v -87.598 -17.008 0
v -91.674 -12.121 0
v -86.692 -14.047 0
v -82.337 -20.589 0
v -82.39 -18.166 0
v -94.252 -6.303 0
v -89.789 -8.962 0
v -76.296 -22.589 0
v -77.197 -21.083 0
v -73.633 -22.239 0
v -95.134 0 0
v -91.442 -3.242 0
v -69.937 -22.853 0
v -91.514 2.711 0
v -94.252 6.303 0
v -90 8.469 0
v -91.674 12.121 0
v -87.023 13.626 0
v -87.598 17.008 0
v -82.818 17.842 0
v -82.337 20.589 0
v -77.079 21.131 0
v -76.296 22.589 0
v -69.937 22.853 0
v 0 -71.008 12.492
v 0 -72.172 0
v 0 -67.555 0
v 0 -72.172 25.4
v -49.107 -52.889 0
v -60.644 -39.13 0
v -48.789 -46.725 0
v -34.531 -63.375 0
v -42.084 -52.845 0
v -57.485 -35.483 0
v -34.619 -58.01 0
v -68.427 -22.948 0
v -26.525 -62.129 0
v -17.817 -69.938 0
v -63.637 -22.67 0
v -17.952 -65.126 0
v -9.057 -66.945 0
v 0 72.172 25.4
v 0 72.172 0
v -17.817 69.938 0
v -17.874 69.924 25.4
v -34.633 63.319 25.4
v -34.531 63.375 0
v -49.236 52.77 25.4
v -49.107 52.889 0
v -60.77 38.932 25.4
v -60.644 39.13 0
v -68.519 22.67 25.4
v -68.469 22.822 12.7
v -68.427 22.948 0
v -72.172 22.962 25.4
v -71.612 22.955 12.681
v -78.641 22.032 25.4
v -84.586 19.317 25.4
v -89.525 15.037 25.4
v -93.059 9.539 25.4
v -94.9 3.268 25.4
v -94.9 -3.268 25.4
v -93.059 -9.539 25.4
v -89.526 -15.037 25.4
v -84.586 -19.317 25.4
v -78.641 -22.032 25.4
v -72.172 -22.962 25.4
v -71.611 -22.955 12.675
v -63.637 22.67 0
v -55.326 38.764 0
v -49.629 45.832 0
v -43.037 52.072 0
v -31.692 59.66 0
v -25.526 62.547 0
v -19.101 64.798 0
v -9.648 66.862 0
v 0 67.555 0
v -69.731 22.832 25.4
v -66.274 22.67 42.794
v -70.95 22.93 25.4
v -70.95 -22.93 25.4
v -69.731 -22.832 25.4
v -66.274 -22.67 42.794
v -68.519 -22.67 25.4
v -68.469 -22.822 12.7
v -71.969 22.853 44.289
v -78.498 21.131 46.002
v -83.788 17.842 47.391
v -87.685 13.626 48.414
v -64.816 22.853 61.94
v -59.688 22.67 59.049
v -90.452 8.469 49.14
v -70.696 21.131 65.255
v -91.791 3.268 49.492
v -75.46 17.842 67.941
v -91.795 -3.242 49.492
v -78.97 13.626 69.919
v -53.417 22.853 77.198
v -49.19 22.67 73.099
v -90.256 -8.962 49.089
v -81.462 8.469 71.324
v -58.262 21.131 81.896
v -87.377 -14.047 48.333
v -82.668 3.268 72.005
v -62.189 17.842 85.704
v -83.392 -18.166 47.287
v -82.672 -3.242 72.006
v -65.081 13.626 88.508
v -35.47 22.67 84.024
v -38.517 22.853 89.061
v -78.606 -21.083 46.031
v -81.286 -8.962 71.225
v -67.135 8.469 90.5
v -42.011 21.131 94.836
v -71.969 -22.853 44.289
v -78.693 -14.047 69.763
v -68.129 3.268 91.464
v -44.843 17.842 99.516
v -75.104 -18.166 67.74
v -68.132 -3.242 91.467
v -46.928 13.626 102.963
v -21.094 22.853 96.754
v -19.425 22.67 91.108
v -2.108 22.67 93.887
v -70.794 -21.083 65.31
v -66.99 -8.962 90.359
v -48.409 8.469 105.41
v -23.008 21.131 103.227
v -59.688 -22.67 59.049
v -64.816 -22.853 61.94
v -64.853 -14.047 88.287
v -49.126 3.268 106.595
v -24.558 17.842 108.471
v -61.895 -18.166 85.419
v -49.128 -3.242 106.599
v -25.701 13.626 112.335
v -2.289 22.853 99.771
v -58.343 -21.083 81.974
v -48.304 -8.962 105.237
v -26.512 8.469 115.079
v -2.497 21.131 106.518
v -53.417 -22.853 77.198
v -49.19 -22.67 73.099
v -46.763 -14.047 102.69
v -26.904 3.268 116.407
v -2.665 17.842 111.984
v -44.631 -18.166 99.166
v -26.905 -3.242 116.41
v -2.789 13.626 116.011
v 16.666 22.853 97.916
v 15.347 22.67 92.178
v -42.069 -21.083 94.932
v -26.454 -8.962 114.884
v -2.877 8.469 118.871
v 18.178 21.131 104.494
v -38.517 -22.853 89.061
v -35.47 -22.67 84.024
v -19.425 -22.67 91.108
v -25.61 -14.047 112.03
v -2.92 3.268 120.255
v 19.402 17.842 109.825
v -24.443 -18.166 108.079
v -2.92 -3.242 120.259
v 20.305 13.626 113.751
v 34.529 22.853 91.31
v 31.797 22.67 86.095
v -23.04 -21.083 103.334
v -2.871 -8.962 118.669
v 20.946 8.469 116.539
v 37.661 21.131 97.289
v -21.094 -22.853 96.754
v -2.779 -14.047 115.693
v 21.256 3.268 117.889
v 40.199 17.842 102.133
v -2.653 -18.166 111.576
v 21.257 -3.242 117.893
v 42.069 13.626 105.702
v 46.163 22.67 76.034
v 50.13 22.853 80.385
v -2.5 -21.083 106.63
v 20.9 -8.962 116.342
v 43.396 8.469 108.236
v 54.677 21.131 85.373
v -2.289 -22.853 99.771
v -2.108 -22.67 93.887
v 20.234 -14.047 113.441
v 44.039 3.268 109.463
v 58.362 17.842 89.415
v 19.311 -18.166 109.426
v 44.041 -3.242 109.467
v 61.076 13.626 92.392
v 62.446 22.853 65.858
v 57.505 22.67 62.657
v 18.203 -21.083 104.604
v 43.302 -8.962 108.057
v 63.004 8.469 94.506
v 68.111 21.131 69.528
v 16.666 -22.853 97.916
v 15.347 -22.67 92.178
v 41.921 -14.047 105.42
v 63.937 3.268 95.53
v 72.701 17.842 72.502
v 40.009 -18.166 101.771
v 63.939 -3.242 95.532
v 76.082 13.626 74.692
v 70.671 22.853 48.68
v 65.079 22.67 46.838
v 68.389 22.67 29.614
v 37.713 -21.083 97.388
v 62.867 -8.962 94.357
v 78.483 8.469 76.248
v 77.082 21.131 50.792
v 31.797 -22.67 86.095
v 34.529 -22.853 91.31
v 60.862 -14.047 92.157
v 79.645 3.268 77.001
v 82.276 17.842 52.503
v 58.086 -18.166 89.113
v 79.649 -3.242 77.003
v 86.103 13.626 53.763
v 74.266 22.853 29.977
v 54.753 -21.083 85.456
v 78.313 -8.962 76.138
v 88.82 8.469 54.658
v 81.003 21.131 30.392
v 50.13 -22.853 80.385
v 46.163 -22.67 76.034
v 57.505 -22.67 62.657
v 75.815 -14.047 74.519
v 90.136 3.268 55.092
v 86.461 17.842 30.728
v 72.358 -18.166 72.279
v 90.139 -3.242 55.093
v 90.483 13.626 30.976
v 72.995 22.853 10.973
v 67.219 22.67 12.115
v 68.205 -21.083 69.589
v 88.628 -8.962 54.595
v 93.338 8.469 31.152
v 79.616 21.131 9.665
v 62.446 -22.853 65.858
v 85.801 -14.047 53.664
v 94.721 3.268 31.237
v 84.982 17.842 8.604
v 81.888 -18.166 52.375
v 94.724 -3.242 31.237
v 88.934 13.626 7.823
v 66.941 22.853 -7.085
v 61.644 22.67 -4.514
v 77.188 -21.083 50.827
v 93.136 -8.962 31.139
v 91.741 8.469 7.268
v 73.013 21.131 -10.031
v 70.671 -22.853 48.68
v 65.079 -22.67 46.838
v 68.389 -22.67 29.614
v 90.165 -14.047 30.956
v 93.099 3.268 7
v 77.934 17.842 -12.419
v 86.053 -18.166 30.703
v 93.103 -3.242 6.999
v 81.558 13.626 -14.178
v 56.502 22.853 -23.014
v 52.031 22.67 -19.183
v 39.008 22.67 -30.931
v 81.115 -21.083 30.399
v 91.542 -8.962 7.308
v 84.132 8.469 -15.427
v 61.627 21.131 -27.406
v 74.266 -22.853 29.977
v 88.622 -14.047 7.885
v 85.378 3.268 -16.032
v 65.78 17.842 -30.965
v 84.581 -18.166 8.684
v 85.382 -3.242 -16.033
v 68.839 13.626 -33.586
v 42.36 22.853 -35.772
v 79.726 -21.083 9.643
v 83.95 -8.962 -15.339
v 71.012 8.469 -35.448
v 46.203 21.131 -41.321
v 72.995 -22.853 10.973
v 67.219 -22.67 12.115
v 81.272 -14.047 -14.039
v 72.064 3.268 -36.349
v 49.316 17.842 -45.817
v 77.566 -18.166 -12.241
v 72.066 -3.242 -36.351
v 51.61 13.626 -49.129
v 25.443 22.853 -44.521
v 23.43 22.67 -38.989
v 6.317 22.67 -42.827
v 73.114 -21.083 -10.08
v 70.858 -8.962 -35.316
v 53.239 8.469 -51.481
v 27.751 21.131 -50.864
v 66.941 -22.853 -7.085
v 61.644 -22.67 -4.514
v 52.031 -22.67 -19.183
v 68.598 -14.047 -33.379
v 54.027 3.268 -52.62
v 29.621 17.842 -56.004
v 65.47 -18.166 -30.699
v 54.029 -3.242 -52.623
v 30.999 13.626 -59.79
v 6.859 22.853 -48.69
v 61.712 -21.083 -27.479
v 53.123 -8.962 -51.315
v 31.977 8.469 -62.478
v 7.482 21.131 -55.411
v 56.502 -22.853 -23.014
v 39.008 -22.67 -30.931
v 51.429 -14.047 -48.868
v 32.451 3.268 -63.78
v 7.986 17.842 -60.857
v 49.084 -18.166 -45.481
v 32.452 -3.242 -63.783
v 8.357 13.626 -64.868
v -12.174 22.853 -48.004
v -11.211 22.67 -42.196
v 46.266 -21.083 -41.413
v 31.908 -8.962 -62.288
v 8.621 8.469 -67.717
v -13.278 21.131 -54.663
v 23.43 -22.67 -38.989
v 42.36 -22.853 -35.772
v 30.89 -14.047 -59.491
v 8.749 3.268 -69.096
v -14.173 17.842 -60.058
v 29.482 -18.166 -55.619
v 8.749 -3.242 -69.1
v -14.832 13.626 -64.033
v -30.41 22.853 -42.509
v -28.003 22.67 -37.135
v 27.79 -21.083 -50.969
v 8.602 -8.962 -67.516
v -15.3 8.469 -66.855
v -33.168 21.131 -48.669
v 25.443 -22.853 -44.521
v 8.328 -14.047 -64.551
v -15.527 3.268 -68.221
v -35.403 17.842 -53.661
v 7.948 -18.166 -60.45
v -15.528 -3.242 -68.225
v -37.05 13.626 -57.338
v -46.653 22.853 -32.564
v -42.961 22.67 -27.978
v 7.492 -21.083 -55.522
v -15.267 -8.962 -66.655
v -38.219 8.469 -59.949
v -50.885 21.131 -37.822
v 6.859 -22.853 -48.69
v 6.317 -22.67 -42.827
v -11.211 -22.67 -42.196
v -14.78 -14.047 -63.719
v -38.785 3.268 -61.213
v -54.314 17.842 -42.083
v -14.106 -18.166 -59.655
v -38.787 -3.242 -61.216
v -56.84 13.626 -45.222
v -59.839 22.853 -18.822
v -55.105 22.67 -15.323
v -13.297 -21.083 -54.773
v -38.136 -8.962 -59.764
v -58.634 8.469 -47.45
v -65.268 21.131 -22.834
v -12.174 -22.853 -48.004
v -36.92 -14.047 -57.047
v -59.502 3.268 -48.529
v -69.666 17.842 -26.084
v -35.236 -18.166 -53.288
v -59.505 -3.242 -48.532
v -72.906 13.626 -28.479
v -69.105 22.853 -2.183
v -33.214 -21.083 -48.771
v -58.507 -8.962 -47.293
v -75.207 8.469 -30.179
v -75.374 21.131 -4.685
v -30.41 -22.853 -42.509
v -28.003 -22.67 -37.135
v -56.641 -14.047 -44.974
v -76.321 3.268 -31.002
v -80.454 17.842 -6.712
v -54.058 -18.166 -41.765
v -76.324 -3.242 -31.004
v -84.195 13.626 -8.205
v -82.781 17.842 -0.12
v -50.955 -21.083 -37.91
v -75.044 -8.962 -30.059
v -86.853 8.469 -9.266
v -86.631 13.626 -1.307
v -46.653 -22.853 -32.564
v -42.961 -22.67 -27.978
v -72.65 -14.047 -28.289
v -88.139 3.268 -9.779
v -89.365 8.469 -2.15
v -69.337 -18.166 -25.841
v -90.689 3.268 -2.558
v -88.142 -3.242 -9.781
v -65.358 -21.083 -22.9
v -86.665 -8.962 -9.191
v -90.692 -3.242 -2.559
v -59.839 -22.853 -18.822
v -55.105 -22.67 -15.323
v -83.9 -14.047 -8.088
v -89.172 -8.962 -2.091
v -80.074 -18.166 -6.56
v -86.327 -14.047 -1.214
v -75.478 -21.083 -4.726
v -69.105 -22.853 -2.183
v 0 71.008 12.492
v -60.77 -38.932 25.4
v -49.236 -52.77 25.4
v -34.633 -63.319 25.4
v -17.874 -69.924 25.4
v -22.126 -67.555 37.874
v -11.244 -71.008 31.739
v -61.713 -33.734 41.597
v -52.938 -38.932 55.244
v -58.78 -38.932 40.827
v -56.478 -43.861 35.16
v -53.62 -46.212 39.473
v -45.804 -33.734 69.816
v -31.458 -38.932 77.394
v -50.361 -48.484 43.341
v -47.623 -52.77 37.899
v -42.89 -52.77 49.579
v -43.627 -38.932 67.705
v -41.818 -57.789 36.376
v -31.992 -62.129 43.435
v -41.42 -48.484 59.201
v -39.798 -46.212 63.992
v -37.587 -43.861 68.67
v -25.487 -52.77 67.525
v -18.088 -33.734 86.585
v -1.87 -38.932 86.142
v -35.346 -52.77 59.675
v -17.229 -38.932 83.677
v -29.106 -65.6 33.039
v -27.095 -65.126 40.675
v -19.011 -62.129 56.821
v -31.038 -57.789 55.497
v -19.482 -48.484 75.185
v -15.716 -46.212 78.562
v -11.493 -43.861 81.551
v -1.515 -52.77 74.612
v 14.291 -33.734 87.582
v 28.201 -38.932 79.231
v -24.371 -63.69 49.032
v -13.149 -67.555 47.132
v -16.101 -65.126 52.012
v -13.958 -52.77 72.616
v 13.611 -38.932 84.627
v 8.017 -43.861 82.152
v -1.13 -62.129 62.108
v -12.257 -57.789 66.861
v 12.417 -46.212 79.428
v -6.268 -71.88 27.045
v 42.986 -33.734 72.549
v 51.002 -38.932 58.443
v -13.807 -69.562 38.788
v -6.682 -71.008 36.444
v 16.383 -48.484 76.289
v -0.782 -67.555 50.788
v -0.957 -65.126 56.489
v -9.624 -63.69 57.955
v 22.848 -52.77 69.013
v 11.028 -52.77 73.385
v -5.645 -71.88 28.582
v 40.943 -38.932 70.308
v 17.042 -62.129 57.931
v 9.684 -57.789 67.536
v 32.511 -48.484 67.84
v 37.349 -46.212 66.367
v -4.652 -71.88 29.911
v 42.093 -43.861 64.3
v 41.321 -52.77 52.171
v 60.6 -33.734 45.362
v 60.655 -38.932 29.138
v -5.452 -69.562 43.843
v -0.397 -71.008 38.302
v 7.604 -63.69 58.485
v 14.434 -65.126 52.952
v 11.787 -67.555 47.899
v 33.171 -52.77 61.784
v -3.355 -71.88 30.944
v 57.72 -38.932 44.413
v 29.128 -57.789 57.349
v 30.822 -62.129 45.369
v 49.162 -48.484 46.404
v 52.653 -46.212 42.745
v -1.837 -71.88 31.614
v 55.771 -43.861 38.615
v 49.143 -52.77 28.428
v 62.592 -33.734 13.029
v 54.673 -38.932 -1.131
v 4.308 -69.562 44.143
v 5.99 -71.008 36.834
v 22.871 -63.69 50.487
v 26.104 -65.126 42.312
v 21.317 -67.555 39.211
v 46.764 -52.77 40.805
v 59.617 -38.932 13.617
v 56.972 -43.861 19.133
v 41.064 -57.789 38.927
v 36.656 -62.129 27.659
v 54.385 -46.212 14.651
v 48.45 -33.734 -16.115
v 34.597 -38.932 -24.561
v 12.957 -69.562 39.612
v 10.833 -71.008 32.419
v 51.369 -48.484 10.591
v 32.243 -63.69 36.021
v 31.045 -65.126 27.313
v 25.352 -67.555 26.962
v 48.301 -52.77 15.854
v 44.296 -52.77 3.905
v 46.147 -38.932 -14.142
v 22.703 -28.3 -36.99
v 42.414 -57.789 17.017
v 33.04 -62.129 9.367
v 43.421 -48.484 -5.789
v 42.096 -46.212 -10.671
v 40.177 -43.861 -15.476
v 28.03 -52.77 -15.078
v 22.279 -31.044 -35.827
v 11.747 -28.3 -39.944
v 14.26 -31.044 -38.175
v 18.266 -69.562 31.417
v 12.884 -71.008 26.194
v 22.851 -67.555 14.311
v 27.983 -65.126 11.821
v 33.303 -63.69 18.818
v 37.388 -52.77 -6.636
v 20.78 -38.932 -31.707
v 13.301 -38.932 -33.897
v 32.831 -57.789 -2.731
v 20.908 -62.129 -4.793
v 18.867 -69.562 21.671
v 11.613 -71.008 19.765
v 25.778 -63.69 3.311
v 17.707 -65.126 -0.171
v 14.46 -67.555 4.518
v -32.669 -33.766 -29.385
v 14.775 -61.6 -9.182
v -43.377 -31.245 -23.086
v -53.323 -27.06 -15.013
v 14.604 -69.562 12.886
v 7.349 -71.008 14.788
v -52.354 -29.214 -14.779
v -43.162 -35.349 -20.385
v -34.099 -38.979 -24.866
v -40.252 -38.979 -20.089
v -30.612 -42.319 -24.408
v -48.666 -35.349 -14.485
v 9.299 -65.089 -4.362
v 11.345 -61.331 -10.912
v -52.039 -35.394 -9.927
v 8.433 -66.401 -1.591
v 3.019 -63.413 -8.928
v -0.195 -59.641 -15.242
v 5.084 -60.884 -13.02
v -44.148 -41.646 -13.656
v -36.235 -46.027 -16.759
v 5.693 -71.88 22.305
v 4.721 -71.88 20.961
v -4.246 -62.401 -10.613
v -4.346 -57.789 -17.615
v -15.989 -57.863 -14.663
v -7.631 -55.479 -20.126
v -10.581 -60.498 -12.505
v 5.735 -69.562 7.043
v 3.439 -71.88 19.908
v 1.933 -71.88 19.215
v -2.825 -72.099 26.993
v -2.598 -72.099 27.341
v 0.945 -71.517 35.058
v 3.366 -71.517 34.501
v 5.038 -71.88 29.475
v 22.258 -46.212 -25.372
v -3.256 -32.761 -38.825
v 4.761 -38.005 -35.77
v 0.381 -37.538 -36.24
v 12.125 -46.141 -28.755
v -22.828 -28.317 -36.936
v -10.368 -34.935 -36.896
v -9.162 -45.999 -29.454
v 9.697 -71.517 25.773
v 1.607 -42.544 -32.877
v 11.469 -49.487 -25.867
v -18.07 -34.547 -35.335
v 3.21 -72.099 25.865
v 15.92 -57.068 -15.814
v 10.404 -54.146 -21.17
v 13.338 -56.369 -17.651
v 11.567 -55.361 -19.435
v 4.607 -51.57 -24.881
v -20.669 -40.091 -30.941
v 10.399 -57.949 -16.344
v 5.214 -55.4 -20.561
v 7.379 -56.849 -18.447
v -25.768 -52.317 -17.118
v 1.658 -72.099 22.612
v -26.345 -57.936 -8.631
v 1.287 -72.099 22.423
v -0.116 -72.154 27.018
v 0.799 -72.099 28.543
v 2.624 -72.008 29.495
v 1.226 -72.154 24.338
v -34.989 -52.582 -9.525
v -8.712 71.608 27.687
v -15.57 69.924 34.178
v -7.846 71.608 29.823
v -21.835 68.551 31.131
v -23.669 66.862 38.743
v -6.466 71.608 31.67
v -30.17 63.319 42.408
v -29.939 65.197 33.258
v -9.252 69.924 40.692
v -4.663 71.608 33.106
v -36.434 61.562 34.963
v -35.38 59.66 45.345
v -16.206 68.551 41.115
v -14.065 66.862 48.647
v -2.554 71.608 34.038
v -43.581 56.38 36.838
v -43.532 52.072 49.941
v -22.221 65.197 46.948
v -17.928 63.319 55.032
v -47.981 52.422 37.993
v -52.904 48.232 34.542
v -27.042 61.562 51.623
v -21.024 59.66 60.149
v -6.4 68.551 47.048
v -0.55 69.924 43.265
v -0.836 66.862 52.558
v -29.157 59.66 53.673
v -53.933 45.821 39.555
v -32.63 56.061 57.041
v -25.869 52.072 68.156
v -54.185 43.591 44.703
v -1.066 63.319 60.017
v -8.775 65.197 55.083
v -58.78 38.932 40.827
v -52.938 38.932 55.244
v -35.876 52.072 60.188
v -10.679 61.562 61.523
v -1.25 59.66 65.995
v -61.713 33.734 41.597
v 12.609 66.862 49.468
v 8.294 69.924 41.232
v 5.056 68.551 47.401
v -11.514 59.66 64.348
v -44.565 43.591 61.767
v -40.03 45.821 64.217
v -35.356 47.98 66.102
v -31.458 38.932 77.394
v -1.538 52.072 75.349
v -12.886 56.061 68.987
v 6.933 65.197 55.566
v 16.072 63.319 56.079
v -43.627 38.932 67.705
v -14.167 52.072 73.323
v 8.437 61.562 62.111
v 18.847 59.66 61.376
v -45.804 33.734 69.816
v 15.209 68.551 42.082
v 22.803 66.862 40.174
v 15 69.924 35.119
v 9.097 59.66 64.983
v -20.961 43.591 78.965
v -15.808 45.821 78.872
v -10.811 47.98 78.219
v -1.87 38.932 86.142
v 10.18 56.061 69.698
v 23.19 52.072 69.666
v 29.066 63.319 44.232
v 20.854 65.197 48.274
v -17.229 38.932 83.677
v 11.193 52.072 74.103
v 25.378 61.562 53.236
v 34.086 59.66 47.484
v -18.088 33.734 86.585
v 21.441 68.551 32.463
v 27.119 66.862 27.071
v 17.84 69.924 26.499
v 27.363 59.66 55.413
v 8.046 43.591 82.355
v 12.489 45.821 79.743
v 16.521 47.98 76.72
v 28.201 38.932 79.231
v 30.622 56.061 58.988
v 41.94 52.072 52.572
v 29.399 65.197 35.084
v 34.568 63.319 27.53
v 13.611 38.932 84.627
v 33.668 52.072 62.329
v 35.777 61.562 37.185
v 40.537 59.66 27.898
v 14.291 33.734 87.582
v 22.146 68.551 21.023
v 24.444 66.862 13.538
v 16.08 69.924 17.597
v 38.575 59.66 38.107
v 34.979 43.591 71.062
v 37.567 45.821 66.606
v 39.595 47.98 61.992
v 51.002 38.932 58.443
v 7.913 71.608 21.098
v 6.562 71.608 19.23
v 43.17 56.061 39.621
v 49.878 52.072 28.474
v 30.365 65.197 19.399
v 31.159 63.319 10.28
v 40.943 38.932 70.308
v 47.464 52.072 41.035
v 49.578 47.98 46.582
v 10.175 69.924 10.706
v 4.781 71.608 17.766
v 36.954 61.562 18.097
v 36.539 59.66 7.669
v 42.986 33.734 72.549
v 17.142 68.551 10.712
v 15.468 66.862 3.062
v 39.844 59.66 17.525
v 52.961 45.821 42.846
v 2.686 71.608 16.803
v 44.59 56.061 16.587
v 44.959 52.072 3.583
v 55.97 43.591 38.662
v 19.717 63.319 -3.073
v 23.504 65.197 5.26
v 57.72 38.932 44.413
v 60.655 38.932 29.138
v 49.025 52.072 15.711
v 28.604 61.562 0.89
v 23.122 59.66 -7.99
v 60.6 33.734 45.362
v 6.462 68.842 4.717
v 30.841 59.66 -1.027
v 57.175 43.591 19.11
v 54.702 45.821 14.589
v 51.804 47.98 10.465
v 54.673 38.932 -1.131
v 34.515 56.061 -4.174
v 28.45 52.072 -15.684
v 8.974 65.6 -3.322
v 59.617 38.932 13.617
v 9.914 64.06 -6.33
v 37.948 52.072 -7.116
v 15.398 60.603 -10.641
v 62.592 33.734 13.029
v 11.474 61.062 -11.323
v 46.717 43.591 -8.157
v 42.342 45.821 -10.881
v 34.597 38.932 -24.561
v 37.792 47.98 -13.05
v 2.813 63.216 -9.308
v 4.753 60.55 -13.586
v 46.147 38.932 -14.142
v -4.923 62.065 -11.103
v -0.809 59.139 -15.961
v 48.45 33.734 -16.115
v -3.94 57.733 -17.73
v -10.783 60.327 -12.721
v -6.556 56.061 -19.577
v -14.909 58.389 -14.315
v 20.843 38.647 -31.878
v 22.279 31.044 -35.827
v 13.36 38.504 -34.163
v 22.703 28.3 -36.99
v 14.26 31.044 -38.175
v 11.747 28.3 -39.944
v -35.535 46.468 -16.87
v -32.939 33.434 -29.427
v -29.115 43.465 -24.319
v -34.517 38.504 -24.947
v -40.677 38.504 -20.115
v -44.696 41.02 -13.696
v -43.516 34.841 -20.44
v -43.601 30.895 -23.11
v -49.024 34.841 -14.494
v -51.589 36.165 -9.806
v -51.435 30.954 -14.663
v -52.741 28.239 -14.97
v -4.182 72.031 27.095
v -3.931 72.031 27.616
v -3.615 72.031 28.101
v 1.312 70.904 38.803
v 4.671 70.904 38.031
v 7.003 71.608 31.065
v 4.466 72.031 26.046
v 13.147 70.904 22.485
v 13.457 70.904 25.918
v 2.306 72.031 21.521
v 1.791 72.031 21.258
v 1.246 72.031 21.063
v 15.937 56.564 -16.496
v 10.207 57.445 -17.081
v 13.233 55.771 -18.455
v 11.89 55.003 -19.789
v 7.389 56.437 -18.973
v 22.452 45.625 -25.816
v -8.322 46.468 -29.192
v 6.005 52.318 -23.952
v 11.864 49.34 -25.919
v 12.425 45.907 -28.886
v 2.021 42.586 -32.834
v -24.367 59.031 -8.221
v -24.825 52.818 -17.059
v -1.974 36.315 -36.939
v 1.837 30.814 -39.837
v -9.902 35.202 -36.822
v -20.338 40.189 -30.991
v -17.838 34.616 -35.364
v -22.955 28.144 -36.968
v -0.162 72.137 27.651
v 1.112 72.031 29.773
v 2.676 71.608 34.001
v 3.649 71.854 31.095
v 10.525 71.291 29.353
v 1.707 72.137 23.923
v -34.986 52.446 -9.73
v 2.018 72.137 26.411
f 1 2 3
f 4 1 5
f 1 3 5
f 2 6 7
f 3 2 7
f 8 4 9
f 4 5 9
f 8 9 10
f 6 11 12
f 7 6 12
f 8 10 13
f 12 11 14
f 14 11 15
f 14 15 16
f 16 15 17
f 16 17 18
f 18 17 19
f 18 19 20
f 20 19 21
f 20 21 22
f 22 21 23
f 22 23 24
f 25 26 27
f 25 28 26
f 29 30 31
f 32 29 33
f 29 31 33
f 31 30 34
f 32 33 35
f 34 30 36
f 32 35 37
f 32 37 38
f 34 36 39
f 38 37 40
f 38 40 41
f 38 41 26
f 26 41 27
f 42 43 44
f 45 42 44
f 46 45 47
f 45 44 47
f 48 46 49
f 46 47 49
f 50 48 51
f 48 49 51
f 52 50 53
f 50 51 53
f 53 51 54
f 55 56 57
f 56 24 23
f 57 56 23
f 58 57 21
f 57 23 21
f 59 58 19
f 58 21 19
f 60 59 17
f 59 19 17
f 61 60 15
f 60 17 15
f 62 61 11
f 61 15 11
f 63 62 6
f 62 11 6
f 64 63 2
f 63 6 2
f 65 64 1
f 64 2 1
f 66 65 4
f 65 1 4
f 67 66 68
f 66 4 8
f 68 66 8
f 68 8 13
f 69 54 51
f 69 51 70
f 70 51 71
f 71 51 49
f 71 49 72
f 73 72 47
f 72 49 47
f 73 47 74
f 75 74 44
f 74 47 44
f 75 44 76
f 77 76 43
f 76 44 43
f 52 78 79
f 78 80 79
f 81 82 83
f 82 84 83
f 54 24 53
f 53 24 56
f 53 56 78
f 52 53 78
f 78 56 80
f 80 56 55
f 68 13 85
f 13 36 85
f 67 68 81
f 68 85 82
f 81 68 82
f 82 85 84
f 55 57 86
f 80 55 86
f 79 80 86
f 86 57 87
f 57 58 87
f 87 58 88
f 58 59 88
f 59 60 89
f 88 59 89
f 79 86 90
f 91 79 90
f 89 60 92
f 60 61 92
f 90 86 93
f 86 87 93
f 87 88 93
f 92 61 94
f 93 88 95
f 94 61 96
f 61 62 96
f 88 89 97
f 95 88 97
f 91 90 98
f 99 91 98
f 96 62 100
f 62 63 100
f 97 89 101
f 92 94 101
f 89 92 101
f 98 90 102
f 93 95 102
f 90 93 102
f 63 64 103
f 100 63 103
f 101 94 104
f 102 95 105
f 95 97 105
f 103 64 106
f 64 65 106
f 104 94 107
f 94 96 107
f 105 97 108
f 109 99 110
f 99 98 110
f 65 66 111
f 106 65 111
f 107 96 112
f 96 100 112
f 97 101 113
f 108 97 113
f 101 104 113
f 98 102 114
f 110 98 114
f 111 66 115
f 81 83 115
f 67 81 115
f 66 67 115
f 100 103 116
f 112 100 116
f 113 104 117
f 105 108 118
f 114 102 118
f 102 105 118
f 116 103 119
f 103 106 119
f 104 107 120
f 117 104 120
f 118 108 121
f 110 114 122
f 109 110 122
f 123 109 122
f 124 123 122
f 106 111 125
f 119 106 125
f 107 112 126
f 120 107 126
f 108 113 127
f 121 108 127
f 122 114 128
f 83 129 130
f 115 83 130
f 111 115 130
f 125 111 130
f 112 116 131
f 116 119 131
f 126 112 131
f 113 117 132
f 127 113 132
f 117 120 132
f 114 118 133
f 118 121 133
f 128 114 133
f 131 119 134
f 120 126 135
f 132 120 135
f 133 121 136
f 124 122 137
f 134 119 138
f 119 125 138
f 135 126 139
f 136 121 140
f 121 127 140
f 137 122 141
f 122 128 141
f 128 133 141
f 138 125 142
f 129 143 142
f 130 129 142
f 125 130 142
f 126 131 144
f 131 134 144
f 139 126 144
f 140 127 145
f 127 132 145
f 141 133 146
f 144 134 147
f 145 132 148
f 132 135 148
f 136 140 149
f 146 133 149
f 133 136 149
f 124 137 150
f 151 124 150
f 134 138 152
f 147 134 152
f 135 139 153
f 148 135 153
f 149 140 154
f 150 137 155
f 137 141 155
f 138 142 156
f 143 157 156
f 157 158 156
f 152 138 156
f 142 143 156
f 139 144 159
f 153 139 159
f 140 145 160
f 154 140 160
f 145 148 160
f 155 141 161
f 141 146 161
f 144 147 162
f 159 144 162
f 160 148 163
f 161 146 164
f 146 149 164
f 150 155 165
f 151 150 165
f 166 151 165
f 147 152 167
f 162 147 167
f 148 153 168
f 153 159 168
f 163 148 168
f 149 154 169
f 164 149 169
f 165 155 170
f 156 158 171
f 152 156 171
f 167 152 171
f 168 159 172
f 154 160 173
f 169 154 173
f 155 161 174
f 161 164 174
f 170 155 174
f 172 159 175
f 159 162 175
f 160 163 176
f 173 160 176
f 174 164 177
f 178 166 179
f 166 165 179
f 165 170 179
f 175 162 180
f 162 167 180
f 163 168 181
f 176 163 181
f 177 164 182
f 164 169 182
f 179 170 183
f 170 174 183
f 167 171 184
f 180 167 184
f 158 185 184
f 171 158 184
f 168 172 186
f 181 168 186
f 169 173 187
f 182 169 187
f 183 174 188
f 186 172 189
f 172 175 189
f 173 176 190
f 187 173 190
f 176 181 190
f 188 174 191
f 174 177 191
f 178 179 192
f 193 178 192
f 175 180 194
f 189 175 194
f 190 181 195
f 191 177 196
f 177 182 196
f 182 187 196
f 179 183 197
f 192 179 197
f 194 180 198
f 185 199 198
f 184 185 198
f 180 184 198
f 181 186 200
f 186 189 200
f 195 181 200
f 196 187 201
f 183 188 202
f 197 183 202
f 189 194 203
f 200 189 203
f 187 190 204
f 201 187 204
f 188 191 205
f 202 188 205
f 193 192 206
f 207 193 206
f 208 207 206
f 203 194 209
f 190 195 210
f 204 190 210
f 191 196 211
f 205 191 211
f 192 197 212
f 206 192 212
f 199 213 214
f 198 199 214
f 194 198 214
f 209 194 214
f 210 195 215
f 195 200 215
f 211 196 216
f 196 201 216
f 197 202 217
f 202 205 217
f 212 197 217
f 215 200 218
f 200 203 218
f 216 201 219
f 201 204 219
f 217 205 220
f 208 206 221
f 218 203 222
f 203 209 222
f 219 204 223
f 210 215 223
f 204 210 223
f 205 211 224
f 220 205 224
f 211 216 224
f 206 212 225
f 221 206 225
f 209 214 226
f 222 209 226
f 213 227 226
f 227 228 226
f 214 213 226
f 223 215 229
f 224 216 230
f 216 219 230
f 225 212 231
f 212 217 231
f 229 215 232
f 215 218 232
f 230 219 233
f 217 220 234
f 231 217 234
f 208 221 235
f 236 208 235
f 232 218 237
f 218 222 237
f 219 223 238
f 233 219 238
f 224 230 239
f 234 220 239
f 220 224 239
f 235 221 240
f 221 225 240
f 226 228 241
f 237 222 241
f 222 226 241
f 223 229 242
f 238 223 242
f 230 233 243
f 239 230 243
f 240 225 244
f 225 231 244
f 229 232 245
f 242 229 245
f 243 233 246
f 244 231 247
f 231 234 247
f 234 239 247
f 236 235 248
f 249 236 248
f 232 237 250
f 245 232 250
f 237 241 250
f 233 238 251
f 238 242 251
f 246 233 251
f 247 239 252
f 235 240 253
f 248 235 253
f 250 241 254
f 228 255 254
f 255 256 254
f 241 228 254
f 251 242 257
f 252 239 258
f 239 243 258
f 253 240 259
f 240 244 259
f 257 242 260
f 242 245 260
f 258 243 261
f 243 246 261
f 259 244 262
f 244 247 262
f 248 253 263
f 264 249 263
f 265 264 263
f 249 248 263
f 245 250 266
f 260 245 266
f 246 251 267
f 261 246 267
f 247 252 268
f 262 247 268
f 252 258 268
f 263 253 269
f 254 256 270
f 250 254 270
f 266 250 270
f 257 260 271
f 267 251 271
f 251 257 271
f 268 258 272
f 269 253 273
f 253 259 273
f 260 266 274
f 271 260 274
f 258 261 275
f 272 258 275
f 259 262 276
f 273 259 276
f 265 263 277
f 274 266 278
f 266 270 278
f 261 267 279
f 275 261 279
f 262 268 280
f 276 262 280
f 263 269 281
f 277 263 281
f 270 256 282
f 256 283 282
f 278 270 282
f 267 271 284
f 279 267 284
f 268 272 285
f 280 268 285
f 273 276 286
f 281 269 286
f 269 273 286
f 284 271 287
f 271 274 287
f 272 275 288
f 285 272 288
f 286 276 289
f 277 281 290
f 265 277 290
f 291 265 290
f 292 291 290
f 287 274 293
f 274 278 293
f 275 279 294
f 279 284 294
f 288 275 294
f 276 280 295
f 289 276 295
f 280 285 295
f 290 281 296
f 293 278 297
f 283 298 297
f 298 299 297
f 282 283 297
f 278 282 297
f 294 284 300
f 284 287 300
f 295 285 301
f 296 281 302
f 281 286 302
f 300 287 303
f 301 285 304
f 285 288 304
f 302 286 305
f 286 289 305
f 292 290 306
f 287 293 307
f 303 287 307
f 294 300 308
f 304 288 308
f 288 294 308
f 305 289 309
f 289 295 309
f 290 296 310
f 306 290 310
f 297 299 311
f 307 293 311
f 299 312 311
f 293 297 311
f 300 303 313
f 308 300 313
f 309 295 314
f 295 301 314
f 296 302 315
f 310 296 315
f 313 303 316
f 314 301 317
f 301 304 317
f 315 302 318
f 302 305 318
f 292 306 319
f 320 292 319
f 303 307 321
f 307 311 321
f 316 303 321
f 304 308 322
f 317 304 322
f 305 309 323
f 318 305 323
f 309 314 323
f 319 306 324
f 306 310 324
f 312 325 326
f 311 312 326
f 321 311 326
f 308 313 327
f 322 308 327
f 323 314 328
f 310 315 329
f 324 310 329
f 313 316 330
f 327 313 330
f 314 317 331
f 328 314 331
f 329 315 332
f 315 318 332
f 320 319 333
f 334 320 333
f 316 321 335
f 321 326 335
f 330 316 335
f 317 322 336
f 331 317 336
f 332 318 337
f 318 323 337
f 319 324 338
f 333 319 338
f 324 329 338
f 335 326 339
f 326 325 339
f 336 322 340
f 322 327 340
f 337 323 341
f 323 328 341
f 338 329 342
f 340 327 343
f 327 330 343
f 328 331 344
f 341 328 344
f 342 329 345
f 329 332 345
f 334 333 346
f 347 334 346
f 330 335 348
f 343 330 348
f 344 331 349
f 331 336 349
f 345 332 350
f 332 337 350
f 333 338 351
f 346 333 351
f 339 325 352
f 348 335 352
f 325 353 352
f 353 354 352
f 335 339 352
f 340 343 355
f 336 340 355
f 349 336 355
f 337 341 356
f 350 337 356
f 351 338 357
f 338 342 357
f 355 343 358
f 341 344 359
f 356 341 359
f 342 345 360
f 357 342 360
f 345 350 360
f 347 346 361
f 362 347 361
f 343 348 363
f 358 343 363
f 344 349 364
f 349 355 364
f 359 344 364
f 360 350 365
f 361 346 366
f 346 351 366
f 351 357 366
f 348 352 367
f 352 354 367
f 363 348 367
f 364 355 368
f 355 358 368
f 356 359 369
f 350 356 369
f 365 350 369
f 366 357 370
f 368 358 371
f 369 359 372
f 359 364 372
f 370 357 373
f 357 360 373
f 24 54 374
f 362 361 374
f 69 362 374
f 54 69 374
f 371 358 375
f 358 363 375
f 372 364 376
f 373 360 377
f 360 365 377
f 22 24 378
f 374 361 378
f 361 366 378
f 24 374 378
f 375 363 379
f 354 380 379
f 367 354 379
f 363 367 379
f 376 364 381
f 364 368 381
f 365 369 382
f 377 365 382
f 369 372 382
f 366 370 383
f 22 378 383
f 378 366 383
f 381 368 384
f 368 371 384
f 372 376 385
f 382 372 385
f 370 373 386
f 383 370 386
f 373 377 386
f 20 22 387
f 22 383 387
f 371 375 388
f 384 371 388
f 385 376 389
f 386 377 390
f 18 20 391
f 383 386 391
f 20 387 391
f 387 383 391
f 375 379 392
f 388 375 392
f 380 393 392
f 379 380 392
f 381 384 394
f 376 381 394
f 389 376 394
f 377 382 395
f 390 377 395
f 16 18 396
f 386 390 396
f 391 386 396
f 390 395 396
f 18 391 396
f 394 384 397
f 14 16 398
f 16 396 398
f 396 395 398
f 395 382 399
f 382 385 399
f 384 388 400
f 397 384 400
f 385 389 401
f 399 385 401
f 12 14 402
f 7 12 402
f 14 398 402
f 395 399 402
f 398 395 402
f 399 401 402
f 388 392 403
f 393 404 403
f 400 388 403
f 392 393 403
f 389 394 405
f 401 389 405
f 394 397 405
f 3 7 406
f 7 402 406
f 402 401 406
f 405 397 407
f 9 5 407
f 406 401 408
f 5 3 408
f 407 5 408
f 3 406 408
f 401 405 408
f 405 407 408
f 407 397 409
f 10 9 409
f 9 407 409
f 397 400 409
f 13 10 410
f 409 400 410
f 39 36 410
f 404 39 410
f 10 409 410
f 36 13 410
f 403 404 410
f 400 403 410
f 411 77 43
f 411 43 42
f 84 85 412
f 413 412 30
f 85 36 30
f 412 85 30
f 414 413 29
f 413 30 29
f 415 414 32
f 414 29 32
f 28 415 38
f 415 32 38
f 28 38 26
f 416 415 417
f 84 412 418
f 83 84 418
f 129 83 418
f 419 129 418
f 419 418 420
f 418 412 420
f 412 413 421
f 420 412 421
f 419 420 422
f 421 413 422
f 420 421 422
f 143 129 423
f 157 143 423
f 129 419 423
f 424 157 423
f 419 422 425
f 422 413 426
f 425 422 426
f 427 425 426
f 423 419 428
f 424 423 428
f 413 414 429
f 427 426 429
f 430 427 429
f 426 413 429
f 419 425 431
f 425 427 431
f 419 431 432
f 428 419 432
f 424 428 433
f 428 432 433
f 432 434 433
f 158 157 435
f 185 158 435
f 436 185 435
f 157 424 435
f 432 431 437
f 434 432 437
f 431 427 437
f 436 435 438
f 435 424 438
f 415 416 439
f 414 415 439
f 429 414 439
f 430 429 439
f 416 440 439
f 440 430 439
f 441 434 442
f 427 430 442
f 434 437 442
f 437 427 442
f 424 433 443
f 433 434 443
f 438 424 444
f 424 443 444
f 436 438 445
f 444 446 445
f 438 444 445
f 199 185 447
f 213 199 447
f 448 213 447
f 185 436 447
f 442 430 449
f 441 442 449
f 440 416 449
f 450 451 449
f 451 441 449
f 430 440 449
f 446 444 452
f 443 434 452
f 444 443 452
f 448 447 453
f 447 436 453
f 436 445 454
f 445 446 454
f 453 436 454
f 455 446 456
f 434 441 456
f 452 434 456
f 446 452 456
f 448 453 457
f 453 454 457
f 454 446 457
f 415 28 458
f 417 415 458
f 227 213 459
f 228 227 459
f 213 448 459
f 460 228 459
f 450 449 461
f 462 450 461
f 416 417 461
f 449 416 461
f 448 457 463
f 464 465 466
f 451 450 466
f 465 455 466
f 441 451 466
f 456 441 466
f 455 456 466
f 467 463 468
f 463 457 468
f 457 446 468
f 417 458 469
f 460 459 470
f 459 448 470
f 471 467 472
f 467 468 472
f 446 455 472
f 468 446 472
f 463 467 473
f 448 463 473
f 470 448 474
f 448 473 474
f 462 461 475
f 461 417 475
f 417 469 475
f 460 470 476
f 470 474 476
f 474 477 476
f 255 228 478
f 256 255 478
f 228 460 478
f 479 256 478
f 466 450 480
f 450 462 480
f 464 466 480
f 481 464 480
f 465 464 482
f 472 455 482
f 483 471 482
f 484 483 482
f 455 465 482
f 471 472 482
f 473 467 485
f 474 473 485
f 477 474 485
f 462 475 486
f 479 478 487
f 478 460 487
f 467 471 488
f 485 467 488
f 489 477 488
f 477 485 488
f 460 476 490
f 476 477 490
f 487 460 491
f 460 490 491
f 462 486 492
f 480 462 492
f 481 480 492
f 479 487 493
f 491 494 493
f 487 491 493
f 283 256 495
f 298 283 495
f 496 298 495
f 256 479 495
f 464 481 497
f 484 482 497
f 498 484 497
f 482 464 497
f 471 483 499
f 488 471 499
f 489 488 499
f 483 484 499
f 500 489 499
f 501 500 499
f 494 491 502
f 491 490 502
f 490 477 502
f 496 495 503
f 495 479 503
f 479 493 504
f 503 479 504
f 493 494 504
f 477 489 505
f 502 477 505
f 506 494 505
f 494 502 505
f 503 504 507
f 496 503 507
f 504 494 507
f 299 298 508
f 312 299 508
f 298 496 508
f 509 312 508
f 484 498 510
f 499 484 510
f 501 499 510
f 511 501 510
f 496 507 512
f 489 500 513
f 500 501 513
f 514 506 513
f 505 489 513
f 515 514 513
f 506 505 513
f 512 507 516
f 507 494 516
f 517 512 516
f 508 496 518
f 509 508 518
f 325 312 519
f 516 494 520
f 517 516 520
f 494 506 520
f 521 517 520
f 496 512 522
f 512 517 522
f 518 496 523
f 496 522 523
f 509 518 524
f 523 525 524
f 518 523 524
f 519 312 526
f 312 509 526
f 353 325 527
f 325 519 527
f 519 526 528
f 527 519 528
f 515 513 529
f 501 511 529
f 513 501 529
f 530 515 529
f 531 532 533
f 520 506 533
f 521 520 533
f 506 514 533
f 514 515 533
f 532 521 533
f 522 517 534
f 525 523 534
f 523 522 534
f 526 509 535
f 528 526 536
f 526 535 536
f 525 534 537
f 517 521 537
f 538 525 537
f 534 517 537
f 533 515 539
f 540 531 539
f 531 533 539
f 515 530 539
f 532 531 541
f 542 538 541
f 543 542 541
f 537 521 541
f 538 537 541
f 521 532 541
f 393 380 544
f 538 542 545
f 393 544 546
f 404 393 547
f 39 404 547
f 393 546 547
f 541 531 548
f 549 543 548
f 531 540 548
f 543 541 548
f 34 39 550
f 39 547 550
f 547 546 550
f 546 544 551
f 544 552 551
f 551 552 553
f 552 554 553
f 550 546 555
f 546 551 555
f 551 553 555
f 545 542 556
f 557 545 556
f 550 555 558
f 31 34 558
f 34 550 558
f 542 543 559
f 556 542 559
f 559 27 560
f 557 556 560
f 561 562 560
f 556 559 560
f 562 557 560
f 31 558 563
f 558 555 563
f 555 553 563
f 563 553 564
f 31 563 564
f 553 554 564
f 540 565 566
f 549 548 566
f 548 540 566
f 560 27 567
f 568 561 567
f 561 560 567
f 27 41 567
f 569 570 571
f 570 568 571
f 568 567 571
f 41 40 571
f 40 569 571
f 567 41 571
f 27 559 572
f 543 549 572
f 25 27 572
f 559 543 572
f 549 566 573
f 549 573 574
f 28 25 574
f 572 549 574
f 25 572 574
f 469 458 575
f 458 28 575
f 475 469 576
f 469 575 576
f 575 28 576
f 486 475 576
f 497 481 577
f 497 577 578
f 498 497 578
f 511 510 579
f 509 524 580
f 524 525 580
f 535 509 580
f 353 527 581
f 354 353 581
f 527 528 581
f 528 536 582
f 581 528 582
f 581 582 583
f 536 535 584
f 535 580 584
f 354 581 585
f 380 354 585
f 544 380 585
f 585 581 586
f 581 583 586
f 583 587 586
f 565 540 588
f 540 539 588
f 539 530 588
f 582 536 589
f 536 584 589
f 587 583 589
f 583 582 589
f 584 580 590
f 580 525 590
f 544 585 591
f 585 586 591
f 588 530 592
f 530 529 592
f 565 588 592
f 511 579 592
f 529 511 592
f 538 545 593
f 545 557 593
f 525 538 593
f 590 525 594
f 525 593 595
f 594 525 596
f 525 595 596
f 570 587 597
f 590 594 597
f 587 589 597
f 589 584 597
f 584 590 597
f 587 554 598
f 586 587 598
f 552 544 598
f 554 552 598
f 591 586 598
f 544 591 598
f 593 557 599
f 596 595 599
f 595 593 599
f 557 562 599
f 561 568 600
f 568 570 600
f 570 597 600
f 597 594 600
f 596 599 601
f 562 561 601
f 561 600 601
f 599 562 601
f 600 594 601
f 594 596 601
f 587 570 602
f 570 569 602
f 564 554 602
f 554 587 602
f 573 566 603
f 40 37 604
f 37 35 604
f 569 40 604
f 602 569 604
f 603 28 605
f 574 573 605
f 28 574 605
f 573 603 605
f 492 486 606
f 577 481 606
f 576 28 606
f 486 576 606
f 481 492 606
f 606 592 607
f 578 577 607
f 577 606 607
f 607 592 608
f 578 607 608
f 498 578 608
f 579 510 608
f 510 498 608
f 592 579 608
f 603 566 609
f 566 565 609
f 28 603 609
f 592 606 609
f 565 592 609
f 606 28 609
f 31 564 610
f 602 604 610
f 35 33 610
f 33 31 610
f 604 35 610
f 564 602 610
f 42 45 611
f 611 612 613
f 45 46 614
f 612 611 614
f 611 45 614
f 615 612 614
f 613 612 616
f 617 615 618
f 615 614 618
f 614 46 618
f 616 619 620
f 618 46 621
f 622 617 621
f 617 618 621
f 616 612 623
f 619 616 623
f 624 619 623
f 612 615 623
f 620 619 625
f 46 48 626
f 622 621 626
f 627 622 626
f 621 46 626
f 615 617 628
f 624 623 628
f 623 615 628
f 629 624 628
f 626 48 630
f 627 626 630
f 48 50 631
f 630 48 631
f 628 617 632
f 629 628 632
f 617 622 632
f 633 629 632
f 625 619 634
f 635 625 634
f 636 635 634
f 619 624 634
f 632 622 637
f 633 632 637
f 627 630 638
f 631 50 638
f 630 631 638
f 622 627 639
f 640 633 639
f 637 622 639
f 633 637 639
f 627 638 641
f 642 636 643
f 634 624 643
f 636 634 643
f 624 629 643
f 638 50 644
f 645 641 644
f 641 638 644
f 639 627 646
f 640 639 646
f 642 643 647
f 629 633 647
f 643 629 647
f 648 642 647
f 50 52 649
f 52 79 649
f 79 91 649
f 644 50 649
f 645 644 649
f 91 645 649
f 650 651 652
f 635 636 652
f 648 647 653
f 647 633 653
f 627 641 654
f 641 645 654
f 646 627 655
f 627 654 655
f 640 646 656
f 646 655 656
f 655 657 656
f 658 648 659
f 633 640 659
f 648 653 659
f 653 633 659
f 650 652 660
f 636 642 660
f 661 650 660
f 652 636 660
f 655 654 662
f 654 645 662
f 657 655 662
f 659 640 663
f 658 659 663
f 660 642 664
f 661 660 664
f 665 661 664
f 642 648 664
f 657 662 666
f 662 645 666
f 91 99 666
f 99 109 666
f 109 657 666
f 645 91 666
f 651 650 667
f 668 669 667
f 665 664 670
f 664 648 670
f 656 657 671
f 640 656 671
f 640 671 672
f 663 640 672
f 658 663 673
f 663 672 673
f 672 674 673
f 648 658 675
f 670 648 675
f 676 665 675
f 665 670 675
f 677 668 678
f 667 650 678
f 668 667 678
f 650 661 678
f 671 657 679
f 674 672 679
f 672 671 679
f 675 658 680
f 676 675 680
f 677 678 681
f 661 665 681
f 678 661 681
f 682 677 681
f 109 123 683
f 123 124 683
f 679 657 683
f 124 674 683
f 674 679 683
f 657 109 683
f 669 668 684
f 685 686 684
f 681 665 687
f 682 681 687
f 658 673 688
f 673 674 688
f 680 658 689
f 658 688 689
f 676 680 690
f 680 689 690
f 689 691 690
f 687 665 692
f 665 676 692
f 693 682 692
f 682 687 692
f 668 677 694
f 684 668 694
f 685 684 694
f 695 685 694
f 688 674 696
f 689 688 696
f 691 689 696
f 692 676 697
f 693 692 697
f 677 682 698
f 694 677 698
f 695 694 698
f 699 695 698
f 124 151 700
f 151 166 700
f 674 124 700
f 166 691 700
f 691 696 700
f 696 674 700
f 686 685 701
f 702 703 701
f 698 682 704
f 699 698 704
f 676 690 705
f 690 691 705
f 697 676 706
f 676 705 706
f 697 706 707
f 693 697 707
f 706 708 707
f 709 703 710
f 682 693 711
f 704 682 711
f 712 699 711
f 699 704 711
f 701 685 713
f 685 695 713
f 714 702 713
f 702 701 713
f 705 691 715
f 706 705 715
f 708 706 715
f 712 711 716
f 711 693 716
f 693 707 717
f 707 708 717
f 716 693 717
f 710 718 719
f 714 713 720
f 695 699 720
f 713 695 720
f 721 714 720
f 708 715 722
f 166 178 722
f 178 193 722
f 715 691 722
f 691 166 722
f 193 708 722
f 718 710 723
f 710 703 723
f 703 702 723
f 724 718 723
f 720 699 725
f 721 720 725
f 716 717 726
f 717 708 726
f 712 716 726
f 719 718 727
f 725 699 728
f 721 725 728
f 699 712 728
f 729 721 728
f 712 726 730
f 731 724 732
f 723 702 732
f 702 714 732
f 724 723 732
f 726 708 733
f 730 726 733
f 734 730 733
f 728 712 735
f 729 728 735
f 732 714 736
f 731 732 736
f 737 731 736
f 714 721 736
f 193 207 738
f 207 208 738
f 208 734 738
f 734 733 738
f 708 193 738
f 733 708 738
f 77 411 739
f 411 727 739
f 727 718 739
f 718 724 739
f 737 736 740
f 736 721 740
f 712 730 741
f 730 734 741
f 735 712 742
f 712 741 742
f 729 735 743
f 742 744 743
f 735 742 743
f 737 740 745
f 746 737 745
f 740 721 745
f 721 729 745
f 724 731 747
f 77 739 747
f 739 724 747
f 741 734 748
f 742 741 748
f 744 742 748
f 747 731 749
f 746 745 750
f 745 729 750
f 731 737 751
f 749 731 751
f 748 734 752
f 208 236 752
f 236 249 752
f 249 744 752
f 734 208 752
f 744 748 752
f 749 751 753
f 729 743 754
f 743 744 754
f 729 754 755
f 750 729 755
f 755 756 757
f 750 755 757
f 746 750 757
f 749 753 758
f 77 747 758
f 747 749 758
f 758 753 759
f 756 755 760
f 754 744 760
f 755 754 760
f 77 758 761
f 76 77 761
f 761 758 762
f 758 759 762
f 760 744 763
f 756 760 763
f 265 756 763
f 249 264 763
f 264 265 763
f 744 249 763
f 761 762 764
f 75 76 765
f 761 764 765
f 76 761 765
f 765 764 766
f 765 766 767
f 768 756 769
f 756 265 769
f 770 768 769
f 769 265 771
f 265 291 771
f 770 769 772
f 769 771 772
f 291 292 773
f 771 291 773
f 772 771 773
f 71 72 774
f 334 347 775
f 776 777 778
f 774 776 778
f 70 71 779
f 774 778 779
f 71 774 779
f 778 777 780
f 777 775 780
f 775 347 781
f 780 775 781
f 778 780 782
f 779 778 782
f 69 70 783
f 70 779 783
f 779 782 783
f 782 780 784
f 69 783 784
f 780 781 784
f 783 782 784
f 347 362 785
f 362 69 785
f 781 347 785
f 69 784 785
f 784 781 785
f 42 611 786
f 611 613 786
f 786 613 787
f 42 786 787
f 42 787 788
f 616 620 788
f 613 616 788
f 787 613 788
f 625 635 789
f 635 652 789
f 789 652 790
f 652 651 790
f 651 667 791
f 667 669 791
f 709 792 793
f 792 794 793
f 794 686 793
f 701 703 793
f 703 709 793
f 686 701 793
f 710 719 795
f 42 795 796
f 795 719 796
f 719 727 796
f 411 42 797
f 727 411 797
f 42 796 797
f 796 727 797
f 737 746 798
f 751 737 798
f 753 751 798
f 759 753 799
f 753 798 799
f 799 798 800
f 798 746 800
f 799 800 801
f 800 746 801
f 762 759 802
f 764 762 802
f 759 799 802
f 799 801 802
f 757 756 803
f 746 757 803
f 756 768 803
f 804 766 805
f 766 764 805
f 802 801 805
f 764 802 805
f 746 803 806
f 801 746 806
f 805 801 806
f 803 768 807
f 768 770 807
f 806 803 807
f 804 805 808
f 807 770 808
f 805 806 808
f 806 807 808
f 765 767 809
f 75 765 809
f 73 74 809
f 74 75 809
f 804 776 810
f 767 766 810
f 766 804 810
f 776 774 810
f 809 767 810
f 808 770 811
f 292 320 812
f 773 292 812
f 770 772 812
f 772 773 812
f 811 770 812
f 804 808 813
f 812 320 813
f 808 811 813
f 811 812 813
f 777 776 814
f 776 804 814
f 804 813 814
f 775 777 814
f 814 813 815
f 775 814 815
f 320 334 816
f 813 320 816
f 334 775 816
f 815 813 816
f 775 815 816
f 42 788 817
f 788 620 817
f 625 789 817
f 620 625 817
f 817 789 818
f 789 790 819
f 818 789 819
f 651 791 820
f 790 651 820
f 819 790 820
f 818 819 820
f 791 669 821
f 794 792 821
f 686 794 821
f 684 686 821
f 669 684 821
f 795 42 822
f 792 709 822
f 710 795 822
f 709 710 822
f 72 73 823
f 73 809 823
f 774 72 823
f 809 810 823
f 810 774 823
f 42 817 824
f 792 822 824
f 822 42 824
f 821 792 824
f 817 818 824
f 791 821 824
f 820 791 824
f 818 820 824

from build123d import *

# Parameters (mm, degrees)
F1_DEPTH = 25.4


with BuildPart() as f1:
    # F0 (on Top) → F1 (new body)
    with BuildSketch(Plane.XY):
        with BuildLine():
            ThreePointArc((-68.519122, 22.669713), (-95.134037, 0), (-68.519122, -22.669713))
            ThreePointArc((-68.519122, -22.669713), (-42.265052, -58.501721), (0, -72.171919))
            Line((0, -72.171919), (0, 72.171919))
            ThreePointArc((0, 72.171919), (-42.265052, 58.501721), (-68.519122, 22.669713))
        make_face()
    extrude(amount=F1_DEPTH)

    # F1_face (on face) → F2 (revolve)
    with BuildSketch(Plane(origin=(-35.565921, 0, 25.4), x_dir=(1, 0, 0), z_dir=(0, 0, 1))):
        with BuildLine():
            ThreePointArc((-32.953201, -22.669713), (-6.699131, -58.501721), (35.565921, -72.171919))
            Line((35.565921, -72.171919), (35.565921, 72.171919))
            ThreePointArc((35.565921, 72.171919), (-6.699131, 58.501721), (-32.953201, 22.669713))
            ThreePointArc((-32.953201, 22.669713), (-59.568116, 0), (-32.953201, -22.669713))
        make_face()
    revolve(axis=Axis((0, 0, 25.4), (0, 1, 0)))


solid = f1.part
